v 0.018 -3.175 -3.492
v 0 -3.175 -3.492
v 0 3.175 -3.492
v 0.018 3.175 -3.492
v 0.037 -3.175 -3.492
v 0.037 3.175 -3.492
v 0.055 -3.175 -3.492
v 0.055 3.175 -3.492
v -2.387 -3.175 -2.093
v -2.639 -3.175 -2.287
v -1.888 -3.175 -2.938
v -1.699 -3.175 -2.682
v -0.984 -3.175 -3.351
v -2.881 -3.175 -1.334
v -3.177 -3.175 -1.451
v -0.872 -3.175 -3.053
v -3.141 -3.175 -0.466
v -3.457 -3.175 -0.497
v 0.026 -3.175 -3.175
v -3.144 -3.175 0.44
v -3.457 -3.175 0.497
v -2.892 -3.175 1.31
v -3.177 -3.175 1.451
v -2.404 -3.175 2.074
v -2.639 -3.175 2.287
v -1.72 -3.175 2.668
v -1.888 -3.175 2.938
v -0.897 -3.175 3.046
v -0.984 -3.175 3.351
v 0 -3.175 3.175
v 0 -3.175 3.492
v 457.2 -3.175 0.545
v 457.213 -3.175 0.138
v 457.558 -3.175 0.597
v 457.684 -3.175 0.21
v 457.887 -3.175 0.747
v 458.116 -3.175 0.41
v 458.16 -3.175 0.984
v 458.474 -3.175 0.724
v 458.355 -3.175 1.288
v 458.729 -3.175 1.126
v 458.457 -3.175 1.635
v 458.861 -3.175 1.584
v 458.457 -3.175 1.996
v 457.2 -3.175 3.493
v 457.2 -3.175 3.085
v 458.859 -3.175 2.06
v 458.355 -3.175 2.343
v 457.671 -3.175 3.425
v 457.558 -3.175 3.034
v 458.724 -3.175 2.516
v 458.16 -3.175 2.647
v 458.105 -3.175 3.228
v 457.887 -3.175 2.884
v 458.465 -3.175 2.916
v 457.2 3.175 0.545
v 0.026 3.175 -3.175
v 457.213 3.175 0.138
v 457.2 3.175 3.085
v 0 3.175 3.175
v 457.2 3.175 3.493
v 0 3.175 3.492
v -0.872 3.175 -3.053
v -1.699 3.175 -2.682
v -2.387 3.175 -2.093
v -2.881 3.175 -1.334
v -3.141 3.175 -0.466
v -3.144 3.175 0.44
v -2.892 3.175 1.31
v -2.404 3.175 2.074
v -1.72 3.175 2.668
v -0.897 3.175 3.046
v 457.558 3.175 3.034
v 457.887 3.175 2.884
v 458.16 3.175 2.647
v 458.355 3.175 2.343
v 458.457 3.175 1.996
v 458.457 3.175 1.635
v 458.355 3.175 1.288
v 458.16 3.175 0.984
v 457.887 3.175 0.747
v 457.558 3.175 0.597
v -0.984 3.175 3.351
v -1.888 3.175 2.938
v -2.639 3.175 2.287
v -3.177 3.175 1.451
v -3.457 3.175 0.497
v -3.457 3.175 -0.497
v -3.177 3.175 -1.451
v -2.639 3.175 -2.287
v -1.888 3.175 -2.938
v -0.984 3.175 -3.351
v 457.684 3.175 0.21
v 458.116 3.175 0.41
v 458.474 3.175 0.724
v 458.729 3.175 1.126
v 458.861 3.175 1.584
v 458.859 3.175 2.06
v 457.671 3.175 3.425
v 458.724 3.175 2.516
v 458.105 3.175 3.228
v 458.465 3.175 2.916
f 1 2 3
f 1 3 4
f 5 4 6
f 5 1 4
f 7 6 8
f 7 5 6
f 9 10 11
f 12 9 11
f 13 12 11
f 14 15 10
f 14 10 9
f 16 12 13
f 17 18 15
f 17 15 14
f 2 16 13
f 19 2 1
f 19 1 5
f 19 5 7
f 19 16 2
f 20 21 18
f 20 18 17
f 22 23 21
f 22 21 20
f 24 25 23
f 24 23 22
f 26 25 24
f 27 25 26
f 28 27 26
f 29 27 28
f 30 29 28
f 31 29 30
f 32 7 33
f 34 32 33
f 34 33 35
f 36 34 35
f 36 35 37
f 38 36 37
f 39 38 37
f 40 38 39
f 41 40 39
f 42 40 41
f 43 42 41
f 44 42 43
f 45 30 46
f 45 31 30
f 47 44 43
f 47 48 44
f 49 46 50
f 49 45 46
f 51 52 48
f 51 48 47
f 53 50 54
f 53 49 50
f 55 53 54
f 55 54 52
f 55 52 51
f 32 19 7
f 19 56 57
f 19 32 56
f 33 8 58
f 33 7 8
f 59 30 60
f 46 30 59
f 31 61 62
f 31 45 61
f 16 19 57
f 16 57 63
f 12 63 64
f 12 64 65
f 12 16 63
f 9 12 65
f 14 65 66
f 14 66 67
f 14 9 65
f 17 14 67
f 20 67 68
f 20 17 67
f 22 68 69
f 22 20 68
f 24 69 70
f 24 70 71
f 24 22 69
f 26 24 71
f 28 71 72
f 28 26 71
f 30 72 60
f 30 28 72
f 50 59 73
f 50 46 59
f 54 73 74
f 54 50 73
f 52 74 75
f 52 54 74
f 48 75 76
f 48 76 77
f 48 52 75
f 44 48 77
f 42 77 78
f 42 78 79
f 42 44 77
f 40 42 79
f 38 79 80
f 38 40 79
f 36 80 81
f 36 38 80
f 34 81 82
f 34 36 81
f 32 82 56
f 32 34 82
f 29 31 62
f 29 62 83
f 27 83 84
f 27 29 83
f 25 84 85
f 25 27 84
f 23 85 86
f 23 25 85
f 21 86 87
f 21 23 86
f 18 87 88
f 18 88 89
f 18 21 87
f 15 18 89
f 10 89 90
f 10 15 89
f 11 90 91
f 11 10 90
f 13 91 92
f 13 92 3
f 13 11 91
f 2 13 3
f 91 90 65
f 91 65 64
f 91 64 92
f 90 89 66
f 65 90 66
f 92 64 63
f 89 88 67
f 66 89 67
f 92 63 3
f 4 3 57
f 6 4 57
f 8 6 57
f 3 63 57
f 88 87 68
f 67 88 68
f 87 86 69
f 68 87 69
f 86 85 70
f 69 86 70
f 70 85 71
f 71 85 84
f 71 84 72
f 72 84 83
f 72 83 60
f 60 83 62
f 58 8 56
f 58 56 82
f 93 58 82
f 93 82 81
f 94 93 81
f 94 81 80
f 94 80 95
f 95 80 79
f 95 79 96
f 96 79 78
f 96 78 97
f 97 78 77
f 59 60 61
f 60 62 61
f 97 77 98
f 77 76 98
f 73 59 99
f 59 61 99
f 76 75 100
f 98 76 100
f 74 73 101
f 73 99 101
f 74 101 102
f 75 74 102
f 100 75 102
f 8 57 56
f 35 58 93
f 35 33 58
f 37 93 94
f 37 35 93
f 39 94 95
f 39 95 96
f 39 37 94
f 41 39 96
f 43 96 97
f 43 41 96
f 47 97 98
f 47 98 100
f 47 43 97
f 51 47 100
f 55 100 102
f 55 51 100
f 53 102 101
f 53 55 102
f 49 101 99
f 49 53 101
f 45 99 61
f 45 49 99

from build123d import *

# Parameters (mm, degrees)
F1_DEPTH = 3.175


with BuildPart() as f1:
    # F0 (on Front) → F1 (new body, symmetric)
    with BuildSketch(Plane.XZ):
        with BuildLine():
            Line((457.2, 3.4925), (0, 3.4925))
            ThreePointArc((0, 3.4925), (-3.4925, 0), (0, -3.4925))
            ThreePointArc((0, -3.4925), (0.027733, -3.49239), (0.055465, -3.49206))
            Line((0.055465, -3.49206), (457.213318, 0.138283))
            ThreePointArc((457.213318, 0.138283), (458.877122, 1.822024), (457.2, 3.4925))
        make_face()
        with BuildLine():
            ThreePointArc((0.025836, -3.174895), (-3.174974, -0.012918), (0, 3.175))
            Line((0, 3.175), (457.200249, 3.085365))
            ThreePointArc((457.200249, 3.085365), (458.47, 1.81524), (457.2, 0.545365))
            Line((457.2, 0.545365), (0.025836, -3.174895))
        make_face(mode=Mode.SUBTRACT)
    extrude(amount=F1_DEPTH, both=True)


solid = f1.part
